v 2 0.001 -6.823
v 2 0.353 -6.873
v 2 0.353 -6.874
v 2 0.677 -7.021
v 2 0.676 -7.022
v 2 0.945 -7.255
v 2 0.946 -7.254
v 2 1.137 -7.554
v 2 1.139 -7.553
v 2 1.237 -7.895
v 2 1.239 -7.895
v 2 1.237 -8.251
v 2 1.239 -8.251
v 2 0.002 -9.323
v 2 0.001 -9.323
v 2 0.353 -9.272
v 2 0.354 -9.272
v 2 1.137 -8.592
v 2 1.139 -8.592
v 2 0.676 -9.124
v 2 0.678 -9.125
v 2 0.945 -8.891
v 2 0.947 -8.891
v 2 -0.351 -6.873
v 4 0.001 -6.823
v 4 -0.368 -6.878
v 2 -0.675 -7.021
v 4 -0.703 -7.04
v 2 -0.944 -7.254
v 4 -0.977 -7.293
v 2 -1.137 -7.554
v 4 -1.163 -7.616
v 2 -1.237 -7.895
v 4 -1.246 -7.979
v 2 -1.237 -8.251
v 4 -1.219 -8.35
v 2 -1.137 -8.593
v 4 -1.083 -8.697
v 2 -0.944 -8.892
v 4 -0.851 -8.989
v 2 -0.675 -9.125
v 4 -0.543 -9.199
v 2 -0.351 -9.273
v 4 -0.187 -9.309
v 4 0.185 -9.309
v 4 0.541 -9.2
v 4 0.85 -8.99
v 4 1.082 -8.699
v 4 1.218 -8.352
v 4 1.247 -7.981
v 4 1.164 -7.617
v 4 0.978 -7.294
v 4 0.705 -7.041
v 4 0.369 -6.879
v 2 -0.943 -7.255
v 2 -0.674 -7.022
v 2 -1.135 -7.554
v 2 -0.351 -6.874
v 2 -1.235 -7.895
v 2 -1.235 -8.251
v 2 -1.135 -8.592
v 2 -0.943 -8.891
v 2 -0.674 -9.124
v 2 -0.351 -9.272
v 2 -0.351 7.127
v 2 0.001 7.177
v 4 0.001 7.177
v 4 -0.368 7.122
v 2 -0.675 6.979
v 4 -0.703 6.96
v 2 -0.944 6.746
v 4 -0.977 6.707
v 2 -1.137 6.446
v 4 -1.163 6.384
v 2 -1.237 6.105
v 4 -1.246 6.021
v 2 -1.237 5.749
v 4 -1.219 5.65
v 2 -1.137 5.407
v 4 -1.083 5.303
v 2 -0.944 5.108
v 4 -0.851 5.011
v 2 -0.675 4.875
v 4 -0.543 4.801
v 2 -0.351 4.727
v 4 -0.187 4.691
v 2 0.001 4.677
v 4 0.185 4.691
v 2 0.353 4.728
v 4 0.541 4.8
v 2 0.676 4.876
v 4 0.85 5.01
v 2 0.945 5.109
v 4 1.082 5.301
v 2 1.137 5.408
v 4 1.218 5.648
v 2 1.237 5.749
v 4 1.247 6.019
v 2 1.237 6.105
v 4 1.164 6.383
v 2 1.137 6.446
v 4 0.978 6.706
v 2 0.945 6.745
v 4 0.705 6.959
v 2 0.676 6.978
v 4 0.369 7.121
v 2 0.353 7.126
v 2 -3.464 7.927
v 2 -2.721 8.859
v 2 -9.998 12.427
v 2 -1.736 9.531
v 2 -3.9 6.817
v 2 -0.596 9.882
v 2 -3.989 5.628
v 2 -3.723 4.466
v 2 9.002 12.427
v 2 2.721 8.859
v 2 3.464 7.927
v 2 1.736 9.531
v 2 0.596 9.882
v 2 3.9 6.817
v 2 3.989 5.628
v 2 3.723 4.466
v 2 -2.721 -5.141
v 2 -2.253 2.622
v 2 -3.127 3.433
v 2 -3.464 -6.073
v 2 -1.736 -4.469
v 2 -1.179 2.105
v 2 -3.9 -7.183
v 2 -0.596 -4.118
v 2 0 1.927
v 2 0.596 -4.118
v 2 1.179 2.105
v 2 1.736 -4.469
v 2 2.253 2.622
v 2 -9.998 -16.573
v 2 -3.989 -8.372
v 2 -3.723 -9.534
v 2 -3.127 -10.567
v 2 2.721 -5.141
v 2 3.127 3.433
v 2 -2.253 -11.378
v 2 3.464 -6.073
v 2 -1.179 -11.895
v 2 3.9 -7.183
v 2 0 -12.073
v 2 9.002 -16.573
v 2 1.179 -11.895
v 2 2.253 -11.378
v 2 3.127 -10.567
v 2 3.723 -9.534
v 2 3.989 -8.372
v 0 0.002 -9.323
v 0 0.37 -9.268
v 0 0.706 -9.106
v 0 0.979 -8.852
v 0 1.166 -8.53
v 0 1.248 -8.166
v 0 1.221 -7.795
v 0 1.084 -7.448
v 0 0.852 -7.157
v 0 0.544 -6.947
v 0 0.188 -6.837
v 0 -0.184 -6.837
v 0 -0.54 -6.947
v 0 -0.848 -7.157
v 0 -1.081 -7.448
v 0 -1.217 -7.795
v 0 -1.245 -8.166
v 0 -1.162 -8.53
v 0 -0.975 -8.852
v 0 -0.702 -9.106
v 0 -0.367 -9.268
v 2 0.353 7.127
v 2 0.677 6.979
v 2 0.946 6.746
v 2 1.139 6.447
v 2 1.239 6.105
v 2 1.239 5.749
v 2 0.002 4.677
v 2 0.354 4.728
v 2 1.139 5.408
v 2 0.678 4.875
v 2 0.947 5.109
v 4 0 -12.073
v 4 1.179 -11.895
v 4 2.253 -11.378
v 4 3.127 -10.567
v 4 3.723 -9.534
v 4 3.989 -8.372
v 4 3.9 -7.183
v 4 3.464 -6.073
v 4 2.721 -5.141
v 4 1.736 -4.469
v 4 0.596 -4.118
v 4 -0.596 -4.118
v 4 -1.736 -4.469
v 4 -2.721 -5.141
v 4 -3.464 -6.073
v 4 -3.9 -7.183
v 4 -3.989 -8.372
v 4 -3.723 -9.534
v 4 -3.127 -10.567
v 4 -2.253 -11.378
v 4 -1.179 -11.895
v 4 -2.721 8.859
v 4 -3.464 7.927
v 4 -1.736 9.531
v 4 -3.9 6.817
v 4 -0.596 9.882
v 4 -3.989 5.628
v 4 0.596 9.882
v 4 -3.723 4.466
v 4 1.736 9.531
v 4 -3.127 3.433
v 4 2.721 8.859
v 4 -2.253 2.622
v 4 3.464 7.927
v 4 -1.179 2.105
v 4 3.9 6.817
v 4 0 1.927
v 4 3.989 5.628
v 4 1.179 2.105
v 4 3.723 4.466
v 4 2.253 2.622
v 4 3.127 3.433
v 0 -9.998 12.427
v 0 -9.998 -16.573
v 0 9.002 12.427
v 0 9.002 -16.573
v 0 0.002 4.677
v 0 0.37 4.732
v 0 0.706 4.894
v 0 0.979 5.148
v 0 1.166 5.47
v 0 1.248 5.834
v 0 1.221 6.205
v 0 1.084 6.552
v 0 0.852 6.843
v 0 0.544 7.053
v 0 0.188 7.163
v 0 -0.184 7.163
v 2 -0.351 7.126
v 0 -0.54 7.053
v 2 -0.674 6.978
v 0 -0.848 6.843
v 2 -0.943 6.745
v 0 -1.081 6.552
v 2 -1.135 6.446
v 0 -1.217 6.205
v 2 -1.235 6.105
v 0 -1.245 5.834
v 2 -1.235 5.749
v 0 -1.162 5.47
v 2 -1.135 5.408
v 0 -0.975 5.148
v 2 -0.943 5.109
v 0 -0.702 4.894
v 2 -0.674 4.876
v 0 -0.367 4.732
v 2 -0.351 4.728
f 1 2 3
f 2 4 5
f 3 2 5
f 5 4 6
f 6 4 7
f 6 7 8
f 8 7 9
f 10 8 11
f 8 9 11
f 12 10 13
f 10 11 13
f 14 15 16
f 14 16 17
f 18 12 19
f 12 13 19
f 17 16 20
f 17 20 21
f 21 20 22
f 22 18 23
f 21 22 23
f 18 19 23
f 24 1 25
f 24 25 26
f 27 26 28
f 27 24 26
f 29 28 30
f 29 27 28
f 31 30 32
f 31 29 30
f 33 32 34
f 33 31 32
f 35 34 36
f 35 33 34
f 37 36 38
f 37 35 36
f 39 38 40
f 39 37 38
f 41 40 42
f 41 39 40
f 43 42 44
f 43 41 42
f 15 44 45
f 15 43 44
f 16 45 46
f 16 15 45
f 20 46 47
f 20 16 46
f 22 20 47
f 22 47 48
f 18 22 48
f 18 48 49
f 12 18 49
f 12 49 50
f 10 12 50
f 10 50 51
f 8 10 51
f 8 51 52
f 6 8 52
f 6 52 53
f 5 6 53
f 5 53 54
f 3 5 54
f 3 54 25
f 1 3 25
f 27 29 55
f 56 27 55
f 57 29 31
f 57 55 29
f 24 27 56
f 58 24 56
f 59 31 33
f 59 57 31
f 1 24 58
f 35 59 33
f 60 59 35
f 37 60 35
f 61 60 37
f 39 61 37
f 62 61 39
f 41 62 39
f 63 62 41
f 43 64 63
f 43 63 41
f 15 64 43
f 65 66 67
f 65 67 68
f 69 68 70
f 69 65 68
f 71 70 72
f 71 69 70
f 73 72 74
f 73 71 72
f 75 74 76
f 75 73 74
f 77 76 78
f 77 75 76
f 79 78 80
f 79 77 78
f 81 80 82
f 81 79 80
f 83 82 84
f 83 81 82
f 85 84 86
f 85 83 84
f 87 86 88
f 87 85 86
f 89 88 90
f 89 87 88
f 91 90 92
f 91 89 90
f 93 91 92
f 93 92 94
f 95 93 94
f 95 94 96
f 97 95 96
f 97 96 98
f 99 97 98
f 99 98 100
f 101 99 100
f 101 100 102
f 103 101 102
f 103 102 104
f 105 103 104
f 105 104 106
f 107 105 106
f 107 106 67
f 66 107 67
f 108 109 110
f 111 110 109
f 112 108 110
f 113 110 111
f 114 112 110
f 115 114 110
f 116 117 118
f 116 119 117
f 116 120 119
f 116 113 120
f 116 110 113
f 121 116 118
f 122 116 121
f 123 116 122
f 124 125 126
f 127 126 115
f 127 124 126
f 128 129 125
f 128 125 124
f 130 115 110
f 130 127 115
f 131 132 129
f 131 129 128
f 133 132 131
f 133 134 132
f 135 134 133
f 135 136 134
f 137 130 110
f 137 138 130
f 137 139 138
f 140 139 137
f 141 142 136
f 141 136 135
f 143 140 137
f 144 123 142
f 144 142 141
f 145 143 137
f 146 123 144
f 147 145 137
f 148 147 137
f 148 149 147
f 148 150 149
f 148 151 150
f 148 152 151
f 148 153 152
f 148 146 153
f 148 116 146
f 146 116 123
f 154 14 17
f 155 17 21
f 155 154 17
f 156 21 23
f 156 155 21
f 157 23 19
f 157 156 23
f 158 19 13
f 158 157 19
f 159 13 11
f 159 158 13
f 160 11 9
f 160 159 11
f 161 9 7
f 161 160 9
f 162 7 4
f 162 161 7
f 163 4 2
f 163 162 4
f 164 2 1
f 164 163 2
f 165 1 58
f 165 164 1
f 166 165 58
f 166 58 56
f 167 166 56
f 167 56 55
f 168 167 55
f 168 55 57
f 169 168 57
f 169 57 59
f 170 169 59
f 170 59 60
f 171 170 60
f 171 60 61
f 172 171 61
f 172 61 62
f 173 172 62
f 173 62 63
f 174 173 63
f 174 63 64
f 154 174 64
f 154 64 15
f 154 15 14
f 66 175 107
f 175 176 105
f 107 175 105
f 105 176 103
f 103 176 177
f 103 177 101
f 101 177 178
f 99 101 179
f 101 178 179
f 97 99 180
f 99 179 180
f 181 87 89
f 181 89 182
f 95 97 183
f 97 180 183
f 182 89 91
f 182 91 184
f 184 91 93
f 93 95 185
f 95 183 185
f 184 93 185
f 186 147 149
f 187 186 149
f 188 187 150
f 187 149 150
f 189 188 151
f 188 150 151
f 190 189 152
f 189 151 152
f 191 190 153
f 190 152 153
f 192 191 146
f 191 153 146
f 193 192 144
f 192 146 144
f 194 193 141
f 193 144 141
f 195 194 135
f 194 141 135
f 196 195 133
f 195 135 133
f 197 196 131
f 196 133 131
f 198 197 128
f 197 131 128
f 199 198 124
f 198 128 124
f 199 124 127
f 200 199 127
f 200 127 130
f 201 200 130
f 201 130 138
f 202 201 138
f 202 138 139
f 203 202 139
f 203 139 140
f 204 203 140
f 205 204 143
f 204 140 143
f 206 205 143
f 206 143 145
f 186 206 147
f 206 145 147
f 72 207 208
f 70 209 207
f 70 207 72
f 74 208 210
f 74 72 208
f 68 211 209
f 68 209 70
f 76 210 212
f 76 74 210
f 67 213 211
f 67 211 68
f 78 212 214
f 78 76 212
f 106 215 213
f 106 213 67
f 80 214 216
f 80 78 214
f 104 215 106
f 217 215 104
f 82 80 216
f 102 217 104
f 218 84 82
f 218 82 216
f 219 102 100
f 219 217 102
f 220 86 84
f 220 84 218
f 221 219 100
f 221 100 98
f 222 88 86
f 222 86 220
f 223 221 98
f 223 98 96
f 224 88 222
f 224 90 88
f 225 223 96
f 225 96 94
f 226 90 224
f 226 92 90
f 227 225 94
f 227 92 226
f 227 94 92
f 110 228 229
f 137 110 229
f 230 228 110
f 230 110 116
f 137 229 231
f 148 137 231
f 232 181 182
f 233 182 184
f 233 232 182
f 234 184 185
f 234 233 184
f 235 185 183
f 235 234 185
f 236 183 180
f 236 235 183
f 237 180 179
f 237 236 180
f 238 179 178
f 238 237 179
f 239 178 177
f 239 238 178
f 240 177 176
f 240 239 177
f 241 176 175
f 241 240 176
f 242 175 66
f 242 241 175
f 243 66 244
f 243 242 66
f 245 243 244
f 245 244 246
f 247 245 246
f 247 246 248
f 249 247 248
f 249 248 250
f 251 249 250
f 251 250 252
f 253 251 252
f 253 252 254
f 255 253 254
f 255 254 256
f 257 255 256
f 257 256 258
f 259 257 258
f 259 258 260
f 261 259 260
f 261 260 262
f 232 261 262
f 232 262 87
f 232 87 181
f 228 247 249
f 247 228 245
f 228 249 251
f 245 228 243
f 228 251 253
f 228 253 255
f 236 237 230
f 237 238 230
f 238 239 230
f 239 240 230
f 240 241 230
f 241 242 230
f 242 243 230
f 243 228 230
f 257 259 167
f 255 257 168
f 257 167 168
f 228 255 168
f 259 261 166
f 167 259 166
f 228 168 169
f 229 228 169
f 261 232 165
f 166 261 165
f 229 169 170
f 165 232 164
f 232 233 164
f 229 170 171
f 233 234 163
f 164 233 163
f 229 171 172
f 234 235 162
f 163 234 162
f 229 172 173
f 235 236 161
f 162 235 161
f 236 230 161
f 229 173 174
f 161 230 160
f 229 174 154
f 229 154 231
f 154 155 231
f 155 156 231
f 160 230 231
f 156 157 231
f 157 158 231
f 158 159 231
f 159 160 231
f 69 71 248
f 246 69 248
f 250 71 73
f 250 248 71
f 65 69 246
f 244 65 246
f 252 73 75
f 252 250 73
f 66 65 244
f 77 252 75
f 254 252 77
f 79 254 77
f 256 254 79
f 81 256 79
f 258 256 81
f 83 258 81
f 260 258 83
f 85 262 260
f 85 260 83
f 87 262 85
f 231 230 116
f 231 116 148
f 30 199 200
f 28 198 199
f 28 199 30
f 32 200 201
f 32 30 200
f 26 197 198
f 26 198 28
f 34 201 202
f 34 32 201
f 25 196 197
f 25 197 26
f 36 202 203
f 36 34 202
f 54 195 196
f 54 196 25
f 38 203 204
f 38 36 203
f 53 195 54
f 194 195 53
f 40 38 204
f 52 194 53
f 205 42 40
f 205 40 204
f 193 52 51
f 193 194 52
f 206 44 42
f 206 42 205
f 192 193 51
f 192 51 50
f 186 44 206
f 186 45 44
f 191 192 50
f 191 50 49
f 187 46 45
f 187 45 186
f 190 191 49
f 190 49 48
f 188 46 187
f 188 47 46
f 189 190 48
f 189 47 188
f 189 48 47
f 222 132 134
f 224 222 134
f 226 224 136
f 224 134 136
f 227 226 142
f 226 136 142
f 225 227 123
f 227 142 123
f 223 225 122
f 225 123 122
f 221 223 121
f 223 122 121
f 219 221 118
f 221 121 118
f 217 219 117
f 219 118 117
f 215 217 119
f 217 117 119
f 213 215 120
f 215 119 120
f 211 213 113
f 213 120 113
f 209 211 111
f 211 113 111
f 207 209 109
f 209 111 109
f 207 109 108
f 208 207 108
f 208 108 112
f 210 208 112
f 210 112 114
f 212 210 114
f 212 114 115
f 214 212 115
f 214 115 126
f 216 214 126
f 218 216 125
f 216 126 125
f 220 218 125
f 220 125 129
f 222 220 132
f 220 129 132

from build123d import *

# Parameters (mm, degrees)
ESBO_O1_W                = 29
ESBO_O1_H                = 19
ESBO_O1_R                = 1.25
RESSALTO_EXTRUS_O1_DEPTH = 2
ESBO_O2_R                = 4
ESBO_O2_R_2              = 1.25
RESSALTO_EXTRUS_O2_DEPTH = 2


with BuildPart() as part:
    # Esboço1 → Ressalto-extrusão1 (new body)
    with BuildSketch(Plane(origin=(0, 0, 0), x_dir=(0, 0, -1), z_dir=(1, 0, 0))):
        with Locations((2.073076923, -0.498076923)):
            Rectangle(ESBO_O1_W, ESBO_O1_H)
        with Locations((8.073076923, 0.001923077)):
            Circle(ESBO_O1_R, mode=Mode.SUBTRACT)
        with Locations((-5.926923077, 0.001923077)):
            Circle(ESBO_O1_R, mode=Mode.SUBTRACT)
    extrude(amount=RESSALTO_EXTRUS_O1_DEPTH)

    # Esboço2 → Ressalto-extrusão2 (add)
    # profile 1 of 2: a face of its own
    with BuildSketch(Plane(origin=(2, 0, 0), x_dir=(0, 0, -1), z_dir=(1, 0, 0))):
        with Locations((8.073076923, 0)):
            Circle(ESBO_O2_R)
        with Locations(Location((8.073076923, 0, 0), (0, 0, 179.955926319))):
            Circle(ESBO_O2_R_2, mode=Mode.SUBTRACT)
    # profile 2 of 2: a face of its own
    with BuildSketch(Plane(origin=(2, 0, 0), x_dir=(0, 0, -1), z_dir=(1, 0, 0))):
        with Locations((-5.926923077, 0)):
            Circle(ESBO_O2_R)
        with Locations(Location((-5.926923077, 0, 0), (0, 0, 179.955926319))):
            Circle(ESBO_O2_R_2, mode=Mode.SUBTRACT)
    extrude(amount=RESSALTO_EXTRUS_O2_DEPTH)


solid = part.part
